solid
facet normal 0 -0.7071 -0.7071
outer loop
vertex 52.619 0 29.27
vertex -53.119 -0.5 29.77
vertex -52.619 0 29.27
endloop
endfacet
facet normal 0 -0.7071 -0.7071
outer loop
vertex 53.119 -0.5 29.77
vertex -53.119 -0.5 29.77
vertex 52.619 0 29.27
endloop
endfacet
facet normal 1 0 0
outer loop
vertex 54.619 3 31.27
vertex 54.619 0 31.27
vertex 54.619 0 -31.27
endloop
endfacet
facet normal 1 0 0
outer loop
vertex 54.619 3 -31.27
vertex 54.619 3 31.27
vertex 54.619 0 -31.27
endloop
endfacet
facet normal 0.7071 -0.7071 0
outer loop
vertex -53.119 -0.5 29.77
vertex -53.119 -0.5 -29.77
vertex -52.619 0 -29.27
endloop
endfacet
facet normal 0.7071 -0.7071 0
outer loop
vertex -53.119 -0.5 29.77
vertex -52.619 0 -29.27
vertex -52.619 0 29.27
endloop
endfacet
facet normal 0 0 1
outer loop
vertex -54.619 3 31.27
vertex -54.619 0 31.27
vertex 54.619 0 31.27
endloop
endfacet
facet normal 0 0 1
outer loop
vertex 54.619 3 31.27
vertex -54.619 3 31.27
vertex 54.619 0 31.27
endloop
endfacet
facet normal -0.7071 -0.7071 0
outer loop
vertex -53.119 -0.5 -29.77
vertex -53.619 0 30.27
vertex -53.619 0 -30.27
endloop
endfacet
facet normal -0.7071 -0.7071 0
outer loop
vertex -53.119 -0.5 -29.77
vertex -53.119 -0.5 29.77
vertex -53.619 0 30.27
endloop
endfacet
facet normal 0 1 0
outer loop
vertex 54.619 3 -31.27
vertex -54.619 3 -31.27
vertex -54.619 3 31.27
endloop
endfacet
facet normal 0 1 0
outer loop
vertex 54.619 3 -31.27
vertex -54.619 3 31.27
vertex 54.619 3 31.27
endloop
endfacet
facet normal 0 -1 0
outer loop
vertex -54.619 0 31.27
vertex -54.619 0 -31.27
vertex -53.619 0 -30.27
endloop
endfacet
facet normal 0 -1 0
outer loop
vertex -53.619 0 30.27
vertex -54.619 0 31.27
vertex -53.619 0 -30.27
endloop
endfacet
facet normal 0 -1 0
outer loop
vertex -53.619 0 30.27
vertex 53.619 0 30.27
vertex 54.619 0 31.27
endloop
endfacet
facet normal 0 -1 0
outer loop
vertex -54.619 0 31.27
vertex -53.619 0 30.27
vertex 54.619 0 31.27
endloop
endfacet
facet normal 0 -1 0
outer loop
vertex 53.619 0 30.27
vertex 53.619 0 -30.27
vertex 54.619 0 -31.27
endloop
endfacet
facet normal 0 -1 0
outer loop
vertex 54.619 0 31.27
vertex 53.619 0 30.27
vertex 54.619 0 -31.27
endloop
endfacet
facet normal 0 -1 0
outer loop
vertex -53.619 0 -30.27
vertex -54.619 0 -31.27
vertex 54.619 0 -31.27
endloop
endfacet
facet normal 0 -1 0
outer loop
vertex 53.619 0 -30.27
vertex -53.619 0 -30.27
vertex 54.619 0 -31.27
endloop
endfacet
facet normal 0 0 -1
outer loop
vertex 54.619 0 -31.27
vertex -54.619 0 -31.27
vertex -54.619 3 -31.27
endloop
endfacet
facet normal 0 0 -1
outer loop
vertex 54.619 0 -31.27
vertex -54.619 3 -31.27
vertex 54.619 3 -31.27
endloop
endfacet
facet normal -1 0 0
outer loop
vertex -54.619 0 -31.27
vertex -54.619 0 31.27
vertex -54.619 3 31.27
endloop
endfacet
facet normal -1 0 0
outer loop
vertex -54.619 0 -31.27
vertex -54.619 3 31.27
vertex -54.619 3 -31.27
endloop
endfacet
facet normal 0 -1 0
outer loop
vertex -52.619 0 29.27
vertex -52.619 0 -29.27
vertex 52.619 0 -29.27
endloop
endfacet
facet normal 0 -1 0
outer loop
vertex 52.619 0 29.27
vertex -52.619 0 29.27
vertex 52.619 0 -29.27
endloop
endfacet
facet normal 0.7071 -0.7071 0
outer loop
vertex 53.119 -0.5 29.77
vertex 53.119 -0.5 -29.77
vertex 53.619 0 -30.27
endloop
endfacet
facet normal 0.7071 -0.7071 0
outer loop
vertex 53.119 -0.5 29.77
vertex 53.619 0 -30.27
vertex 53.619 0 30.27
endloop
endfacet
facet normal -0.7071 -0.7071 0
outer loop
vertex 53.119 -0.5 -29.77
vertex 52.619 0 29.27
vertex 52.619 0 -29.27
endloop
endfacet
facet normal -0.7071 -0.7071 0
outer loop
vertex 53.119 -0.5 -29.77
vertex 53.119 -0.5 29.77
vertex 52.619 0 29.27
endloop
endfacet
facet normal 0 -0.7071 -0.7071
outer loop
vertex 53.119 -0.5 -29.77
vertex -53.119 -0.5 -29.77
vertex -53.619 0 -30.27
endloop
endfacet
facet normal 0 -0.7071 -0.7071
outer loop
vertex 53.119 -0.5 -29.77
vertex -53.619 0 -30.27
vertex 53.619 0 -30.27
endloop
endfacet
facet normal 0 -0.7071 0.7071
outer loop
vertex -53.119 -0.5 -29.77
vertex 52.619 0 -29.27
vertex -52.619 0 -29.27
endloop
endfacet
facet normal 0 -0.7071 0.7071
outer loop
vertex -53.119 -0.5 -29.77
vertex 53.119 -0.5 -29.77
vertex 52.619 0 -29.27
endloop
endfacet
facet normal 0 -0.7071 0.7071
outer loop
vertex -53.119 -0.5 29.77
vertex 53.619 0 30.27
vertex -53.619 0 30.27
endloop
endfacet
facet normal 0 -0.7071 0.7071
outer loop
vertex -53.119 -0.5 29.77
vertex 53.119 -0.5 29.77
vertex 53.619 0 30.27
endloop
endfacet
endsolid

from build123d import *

# Parameters (mm, degrees)
SKETCH1_W           = 109.238
SKETCH1_H           = 62.54
BOSS_EXTRUDE1_DEPTH = 3
SKETCH2_W           = 107.238
SKETCH2_H           = 60.54
SKETCH2_W_2         = 105.238
SKETCH2_H_2         = 58.54
BOSS_EXTRUDE2_DEPTH = 3
BOSS_EXTRUDE2_TAPER = 45


with BuildPart() as part:
    # Sketch1 → Boss-Extrude1 (new body)
    with BuildSketch(Plane(origin=(0, 0, 0), x_dir=(1, 0, 0), z_dir=(0, 1, 0))):
        Rectangle(SKETCH1_W, SKETCH1_H)
    extrude(amount=BOSS_EXTRUDE1_DEPTH)

    # Sketch2 → Boss-Extrude2 (add)
    with BuildSketch(Plane.XZ):
        Rectangle(SKETCH2_W, SKETCH2_H)
        Rectangle(SKETCH2_W_2, SKETCH2_H_2, mode=Mode.SUBTRACT)
    extrude(amount=BOSS_EXTRUDE2_DEPTH, taper=BOSS_EXTRUDE2_TAPER)


solid = part.part
